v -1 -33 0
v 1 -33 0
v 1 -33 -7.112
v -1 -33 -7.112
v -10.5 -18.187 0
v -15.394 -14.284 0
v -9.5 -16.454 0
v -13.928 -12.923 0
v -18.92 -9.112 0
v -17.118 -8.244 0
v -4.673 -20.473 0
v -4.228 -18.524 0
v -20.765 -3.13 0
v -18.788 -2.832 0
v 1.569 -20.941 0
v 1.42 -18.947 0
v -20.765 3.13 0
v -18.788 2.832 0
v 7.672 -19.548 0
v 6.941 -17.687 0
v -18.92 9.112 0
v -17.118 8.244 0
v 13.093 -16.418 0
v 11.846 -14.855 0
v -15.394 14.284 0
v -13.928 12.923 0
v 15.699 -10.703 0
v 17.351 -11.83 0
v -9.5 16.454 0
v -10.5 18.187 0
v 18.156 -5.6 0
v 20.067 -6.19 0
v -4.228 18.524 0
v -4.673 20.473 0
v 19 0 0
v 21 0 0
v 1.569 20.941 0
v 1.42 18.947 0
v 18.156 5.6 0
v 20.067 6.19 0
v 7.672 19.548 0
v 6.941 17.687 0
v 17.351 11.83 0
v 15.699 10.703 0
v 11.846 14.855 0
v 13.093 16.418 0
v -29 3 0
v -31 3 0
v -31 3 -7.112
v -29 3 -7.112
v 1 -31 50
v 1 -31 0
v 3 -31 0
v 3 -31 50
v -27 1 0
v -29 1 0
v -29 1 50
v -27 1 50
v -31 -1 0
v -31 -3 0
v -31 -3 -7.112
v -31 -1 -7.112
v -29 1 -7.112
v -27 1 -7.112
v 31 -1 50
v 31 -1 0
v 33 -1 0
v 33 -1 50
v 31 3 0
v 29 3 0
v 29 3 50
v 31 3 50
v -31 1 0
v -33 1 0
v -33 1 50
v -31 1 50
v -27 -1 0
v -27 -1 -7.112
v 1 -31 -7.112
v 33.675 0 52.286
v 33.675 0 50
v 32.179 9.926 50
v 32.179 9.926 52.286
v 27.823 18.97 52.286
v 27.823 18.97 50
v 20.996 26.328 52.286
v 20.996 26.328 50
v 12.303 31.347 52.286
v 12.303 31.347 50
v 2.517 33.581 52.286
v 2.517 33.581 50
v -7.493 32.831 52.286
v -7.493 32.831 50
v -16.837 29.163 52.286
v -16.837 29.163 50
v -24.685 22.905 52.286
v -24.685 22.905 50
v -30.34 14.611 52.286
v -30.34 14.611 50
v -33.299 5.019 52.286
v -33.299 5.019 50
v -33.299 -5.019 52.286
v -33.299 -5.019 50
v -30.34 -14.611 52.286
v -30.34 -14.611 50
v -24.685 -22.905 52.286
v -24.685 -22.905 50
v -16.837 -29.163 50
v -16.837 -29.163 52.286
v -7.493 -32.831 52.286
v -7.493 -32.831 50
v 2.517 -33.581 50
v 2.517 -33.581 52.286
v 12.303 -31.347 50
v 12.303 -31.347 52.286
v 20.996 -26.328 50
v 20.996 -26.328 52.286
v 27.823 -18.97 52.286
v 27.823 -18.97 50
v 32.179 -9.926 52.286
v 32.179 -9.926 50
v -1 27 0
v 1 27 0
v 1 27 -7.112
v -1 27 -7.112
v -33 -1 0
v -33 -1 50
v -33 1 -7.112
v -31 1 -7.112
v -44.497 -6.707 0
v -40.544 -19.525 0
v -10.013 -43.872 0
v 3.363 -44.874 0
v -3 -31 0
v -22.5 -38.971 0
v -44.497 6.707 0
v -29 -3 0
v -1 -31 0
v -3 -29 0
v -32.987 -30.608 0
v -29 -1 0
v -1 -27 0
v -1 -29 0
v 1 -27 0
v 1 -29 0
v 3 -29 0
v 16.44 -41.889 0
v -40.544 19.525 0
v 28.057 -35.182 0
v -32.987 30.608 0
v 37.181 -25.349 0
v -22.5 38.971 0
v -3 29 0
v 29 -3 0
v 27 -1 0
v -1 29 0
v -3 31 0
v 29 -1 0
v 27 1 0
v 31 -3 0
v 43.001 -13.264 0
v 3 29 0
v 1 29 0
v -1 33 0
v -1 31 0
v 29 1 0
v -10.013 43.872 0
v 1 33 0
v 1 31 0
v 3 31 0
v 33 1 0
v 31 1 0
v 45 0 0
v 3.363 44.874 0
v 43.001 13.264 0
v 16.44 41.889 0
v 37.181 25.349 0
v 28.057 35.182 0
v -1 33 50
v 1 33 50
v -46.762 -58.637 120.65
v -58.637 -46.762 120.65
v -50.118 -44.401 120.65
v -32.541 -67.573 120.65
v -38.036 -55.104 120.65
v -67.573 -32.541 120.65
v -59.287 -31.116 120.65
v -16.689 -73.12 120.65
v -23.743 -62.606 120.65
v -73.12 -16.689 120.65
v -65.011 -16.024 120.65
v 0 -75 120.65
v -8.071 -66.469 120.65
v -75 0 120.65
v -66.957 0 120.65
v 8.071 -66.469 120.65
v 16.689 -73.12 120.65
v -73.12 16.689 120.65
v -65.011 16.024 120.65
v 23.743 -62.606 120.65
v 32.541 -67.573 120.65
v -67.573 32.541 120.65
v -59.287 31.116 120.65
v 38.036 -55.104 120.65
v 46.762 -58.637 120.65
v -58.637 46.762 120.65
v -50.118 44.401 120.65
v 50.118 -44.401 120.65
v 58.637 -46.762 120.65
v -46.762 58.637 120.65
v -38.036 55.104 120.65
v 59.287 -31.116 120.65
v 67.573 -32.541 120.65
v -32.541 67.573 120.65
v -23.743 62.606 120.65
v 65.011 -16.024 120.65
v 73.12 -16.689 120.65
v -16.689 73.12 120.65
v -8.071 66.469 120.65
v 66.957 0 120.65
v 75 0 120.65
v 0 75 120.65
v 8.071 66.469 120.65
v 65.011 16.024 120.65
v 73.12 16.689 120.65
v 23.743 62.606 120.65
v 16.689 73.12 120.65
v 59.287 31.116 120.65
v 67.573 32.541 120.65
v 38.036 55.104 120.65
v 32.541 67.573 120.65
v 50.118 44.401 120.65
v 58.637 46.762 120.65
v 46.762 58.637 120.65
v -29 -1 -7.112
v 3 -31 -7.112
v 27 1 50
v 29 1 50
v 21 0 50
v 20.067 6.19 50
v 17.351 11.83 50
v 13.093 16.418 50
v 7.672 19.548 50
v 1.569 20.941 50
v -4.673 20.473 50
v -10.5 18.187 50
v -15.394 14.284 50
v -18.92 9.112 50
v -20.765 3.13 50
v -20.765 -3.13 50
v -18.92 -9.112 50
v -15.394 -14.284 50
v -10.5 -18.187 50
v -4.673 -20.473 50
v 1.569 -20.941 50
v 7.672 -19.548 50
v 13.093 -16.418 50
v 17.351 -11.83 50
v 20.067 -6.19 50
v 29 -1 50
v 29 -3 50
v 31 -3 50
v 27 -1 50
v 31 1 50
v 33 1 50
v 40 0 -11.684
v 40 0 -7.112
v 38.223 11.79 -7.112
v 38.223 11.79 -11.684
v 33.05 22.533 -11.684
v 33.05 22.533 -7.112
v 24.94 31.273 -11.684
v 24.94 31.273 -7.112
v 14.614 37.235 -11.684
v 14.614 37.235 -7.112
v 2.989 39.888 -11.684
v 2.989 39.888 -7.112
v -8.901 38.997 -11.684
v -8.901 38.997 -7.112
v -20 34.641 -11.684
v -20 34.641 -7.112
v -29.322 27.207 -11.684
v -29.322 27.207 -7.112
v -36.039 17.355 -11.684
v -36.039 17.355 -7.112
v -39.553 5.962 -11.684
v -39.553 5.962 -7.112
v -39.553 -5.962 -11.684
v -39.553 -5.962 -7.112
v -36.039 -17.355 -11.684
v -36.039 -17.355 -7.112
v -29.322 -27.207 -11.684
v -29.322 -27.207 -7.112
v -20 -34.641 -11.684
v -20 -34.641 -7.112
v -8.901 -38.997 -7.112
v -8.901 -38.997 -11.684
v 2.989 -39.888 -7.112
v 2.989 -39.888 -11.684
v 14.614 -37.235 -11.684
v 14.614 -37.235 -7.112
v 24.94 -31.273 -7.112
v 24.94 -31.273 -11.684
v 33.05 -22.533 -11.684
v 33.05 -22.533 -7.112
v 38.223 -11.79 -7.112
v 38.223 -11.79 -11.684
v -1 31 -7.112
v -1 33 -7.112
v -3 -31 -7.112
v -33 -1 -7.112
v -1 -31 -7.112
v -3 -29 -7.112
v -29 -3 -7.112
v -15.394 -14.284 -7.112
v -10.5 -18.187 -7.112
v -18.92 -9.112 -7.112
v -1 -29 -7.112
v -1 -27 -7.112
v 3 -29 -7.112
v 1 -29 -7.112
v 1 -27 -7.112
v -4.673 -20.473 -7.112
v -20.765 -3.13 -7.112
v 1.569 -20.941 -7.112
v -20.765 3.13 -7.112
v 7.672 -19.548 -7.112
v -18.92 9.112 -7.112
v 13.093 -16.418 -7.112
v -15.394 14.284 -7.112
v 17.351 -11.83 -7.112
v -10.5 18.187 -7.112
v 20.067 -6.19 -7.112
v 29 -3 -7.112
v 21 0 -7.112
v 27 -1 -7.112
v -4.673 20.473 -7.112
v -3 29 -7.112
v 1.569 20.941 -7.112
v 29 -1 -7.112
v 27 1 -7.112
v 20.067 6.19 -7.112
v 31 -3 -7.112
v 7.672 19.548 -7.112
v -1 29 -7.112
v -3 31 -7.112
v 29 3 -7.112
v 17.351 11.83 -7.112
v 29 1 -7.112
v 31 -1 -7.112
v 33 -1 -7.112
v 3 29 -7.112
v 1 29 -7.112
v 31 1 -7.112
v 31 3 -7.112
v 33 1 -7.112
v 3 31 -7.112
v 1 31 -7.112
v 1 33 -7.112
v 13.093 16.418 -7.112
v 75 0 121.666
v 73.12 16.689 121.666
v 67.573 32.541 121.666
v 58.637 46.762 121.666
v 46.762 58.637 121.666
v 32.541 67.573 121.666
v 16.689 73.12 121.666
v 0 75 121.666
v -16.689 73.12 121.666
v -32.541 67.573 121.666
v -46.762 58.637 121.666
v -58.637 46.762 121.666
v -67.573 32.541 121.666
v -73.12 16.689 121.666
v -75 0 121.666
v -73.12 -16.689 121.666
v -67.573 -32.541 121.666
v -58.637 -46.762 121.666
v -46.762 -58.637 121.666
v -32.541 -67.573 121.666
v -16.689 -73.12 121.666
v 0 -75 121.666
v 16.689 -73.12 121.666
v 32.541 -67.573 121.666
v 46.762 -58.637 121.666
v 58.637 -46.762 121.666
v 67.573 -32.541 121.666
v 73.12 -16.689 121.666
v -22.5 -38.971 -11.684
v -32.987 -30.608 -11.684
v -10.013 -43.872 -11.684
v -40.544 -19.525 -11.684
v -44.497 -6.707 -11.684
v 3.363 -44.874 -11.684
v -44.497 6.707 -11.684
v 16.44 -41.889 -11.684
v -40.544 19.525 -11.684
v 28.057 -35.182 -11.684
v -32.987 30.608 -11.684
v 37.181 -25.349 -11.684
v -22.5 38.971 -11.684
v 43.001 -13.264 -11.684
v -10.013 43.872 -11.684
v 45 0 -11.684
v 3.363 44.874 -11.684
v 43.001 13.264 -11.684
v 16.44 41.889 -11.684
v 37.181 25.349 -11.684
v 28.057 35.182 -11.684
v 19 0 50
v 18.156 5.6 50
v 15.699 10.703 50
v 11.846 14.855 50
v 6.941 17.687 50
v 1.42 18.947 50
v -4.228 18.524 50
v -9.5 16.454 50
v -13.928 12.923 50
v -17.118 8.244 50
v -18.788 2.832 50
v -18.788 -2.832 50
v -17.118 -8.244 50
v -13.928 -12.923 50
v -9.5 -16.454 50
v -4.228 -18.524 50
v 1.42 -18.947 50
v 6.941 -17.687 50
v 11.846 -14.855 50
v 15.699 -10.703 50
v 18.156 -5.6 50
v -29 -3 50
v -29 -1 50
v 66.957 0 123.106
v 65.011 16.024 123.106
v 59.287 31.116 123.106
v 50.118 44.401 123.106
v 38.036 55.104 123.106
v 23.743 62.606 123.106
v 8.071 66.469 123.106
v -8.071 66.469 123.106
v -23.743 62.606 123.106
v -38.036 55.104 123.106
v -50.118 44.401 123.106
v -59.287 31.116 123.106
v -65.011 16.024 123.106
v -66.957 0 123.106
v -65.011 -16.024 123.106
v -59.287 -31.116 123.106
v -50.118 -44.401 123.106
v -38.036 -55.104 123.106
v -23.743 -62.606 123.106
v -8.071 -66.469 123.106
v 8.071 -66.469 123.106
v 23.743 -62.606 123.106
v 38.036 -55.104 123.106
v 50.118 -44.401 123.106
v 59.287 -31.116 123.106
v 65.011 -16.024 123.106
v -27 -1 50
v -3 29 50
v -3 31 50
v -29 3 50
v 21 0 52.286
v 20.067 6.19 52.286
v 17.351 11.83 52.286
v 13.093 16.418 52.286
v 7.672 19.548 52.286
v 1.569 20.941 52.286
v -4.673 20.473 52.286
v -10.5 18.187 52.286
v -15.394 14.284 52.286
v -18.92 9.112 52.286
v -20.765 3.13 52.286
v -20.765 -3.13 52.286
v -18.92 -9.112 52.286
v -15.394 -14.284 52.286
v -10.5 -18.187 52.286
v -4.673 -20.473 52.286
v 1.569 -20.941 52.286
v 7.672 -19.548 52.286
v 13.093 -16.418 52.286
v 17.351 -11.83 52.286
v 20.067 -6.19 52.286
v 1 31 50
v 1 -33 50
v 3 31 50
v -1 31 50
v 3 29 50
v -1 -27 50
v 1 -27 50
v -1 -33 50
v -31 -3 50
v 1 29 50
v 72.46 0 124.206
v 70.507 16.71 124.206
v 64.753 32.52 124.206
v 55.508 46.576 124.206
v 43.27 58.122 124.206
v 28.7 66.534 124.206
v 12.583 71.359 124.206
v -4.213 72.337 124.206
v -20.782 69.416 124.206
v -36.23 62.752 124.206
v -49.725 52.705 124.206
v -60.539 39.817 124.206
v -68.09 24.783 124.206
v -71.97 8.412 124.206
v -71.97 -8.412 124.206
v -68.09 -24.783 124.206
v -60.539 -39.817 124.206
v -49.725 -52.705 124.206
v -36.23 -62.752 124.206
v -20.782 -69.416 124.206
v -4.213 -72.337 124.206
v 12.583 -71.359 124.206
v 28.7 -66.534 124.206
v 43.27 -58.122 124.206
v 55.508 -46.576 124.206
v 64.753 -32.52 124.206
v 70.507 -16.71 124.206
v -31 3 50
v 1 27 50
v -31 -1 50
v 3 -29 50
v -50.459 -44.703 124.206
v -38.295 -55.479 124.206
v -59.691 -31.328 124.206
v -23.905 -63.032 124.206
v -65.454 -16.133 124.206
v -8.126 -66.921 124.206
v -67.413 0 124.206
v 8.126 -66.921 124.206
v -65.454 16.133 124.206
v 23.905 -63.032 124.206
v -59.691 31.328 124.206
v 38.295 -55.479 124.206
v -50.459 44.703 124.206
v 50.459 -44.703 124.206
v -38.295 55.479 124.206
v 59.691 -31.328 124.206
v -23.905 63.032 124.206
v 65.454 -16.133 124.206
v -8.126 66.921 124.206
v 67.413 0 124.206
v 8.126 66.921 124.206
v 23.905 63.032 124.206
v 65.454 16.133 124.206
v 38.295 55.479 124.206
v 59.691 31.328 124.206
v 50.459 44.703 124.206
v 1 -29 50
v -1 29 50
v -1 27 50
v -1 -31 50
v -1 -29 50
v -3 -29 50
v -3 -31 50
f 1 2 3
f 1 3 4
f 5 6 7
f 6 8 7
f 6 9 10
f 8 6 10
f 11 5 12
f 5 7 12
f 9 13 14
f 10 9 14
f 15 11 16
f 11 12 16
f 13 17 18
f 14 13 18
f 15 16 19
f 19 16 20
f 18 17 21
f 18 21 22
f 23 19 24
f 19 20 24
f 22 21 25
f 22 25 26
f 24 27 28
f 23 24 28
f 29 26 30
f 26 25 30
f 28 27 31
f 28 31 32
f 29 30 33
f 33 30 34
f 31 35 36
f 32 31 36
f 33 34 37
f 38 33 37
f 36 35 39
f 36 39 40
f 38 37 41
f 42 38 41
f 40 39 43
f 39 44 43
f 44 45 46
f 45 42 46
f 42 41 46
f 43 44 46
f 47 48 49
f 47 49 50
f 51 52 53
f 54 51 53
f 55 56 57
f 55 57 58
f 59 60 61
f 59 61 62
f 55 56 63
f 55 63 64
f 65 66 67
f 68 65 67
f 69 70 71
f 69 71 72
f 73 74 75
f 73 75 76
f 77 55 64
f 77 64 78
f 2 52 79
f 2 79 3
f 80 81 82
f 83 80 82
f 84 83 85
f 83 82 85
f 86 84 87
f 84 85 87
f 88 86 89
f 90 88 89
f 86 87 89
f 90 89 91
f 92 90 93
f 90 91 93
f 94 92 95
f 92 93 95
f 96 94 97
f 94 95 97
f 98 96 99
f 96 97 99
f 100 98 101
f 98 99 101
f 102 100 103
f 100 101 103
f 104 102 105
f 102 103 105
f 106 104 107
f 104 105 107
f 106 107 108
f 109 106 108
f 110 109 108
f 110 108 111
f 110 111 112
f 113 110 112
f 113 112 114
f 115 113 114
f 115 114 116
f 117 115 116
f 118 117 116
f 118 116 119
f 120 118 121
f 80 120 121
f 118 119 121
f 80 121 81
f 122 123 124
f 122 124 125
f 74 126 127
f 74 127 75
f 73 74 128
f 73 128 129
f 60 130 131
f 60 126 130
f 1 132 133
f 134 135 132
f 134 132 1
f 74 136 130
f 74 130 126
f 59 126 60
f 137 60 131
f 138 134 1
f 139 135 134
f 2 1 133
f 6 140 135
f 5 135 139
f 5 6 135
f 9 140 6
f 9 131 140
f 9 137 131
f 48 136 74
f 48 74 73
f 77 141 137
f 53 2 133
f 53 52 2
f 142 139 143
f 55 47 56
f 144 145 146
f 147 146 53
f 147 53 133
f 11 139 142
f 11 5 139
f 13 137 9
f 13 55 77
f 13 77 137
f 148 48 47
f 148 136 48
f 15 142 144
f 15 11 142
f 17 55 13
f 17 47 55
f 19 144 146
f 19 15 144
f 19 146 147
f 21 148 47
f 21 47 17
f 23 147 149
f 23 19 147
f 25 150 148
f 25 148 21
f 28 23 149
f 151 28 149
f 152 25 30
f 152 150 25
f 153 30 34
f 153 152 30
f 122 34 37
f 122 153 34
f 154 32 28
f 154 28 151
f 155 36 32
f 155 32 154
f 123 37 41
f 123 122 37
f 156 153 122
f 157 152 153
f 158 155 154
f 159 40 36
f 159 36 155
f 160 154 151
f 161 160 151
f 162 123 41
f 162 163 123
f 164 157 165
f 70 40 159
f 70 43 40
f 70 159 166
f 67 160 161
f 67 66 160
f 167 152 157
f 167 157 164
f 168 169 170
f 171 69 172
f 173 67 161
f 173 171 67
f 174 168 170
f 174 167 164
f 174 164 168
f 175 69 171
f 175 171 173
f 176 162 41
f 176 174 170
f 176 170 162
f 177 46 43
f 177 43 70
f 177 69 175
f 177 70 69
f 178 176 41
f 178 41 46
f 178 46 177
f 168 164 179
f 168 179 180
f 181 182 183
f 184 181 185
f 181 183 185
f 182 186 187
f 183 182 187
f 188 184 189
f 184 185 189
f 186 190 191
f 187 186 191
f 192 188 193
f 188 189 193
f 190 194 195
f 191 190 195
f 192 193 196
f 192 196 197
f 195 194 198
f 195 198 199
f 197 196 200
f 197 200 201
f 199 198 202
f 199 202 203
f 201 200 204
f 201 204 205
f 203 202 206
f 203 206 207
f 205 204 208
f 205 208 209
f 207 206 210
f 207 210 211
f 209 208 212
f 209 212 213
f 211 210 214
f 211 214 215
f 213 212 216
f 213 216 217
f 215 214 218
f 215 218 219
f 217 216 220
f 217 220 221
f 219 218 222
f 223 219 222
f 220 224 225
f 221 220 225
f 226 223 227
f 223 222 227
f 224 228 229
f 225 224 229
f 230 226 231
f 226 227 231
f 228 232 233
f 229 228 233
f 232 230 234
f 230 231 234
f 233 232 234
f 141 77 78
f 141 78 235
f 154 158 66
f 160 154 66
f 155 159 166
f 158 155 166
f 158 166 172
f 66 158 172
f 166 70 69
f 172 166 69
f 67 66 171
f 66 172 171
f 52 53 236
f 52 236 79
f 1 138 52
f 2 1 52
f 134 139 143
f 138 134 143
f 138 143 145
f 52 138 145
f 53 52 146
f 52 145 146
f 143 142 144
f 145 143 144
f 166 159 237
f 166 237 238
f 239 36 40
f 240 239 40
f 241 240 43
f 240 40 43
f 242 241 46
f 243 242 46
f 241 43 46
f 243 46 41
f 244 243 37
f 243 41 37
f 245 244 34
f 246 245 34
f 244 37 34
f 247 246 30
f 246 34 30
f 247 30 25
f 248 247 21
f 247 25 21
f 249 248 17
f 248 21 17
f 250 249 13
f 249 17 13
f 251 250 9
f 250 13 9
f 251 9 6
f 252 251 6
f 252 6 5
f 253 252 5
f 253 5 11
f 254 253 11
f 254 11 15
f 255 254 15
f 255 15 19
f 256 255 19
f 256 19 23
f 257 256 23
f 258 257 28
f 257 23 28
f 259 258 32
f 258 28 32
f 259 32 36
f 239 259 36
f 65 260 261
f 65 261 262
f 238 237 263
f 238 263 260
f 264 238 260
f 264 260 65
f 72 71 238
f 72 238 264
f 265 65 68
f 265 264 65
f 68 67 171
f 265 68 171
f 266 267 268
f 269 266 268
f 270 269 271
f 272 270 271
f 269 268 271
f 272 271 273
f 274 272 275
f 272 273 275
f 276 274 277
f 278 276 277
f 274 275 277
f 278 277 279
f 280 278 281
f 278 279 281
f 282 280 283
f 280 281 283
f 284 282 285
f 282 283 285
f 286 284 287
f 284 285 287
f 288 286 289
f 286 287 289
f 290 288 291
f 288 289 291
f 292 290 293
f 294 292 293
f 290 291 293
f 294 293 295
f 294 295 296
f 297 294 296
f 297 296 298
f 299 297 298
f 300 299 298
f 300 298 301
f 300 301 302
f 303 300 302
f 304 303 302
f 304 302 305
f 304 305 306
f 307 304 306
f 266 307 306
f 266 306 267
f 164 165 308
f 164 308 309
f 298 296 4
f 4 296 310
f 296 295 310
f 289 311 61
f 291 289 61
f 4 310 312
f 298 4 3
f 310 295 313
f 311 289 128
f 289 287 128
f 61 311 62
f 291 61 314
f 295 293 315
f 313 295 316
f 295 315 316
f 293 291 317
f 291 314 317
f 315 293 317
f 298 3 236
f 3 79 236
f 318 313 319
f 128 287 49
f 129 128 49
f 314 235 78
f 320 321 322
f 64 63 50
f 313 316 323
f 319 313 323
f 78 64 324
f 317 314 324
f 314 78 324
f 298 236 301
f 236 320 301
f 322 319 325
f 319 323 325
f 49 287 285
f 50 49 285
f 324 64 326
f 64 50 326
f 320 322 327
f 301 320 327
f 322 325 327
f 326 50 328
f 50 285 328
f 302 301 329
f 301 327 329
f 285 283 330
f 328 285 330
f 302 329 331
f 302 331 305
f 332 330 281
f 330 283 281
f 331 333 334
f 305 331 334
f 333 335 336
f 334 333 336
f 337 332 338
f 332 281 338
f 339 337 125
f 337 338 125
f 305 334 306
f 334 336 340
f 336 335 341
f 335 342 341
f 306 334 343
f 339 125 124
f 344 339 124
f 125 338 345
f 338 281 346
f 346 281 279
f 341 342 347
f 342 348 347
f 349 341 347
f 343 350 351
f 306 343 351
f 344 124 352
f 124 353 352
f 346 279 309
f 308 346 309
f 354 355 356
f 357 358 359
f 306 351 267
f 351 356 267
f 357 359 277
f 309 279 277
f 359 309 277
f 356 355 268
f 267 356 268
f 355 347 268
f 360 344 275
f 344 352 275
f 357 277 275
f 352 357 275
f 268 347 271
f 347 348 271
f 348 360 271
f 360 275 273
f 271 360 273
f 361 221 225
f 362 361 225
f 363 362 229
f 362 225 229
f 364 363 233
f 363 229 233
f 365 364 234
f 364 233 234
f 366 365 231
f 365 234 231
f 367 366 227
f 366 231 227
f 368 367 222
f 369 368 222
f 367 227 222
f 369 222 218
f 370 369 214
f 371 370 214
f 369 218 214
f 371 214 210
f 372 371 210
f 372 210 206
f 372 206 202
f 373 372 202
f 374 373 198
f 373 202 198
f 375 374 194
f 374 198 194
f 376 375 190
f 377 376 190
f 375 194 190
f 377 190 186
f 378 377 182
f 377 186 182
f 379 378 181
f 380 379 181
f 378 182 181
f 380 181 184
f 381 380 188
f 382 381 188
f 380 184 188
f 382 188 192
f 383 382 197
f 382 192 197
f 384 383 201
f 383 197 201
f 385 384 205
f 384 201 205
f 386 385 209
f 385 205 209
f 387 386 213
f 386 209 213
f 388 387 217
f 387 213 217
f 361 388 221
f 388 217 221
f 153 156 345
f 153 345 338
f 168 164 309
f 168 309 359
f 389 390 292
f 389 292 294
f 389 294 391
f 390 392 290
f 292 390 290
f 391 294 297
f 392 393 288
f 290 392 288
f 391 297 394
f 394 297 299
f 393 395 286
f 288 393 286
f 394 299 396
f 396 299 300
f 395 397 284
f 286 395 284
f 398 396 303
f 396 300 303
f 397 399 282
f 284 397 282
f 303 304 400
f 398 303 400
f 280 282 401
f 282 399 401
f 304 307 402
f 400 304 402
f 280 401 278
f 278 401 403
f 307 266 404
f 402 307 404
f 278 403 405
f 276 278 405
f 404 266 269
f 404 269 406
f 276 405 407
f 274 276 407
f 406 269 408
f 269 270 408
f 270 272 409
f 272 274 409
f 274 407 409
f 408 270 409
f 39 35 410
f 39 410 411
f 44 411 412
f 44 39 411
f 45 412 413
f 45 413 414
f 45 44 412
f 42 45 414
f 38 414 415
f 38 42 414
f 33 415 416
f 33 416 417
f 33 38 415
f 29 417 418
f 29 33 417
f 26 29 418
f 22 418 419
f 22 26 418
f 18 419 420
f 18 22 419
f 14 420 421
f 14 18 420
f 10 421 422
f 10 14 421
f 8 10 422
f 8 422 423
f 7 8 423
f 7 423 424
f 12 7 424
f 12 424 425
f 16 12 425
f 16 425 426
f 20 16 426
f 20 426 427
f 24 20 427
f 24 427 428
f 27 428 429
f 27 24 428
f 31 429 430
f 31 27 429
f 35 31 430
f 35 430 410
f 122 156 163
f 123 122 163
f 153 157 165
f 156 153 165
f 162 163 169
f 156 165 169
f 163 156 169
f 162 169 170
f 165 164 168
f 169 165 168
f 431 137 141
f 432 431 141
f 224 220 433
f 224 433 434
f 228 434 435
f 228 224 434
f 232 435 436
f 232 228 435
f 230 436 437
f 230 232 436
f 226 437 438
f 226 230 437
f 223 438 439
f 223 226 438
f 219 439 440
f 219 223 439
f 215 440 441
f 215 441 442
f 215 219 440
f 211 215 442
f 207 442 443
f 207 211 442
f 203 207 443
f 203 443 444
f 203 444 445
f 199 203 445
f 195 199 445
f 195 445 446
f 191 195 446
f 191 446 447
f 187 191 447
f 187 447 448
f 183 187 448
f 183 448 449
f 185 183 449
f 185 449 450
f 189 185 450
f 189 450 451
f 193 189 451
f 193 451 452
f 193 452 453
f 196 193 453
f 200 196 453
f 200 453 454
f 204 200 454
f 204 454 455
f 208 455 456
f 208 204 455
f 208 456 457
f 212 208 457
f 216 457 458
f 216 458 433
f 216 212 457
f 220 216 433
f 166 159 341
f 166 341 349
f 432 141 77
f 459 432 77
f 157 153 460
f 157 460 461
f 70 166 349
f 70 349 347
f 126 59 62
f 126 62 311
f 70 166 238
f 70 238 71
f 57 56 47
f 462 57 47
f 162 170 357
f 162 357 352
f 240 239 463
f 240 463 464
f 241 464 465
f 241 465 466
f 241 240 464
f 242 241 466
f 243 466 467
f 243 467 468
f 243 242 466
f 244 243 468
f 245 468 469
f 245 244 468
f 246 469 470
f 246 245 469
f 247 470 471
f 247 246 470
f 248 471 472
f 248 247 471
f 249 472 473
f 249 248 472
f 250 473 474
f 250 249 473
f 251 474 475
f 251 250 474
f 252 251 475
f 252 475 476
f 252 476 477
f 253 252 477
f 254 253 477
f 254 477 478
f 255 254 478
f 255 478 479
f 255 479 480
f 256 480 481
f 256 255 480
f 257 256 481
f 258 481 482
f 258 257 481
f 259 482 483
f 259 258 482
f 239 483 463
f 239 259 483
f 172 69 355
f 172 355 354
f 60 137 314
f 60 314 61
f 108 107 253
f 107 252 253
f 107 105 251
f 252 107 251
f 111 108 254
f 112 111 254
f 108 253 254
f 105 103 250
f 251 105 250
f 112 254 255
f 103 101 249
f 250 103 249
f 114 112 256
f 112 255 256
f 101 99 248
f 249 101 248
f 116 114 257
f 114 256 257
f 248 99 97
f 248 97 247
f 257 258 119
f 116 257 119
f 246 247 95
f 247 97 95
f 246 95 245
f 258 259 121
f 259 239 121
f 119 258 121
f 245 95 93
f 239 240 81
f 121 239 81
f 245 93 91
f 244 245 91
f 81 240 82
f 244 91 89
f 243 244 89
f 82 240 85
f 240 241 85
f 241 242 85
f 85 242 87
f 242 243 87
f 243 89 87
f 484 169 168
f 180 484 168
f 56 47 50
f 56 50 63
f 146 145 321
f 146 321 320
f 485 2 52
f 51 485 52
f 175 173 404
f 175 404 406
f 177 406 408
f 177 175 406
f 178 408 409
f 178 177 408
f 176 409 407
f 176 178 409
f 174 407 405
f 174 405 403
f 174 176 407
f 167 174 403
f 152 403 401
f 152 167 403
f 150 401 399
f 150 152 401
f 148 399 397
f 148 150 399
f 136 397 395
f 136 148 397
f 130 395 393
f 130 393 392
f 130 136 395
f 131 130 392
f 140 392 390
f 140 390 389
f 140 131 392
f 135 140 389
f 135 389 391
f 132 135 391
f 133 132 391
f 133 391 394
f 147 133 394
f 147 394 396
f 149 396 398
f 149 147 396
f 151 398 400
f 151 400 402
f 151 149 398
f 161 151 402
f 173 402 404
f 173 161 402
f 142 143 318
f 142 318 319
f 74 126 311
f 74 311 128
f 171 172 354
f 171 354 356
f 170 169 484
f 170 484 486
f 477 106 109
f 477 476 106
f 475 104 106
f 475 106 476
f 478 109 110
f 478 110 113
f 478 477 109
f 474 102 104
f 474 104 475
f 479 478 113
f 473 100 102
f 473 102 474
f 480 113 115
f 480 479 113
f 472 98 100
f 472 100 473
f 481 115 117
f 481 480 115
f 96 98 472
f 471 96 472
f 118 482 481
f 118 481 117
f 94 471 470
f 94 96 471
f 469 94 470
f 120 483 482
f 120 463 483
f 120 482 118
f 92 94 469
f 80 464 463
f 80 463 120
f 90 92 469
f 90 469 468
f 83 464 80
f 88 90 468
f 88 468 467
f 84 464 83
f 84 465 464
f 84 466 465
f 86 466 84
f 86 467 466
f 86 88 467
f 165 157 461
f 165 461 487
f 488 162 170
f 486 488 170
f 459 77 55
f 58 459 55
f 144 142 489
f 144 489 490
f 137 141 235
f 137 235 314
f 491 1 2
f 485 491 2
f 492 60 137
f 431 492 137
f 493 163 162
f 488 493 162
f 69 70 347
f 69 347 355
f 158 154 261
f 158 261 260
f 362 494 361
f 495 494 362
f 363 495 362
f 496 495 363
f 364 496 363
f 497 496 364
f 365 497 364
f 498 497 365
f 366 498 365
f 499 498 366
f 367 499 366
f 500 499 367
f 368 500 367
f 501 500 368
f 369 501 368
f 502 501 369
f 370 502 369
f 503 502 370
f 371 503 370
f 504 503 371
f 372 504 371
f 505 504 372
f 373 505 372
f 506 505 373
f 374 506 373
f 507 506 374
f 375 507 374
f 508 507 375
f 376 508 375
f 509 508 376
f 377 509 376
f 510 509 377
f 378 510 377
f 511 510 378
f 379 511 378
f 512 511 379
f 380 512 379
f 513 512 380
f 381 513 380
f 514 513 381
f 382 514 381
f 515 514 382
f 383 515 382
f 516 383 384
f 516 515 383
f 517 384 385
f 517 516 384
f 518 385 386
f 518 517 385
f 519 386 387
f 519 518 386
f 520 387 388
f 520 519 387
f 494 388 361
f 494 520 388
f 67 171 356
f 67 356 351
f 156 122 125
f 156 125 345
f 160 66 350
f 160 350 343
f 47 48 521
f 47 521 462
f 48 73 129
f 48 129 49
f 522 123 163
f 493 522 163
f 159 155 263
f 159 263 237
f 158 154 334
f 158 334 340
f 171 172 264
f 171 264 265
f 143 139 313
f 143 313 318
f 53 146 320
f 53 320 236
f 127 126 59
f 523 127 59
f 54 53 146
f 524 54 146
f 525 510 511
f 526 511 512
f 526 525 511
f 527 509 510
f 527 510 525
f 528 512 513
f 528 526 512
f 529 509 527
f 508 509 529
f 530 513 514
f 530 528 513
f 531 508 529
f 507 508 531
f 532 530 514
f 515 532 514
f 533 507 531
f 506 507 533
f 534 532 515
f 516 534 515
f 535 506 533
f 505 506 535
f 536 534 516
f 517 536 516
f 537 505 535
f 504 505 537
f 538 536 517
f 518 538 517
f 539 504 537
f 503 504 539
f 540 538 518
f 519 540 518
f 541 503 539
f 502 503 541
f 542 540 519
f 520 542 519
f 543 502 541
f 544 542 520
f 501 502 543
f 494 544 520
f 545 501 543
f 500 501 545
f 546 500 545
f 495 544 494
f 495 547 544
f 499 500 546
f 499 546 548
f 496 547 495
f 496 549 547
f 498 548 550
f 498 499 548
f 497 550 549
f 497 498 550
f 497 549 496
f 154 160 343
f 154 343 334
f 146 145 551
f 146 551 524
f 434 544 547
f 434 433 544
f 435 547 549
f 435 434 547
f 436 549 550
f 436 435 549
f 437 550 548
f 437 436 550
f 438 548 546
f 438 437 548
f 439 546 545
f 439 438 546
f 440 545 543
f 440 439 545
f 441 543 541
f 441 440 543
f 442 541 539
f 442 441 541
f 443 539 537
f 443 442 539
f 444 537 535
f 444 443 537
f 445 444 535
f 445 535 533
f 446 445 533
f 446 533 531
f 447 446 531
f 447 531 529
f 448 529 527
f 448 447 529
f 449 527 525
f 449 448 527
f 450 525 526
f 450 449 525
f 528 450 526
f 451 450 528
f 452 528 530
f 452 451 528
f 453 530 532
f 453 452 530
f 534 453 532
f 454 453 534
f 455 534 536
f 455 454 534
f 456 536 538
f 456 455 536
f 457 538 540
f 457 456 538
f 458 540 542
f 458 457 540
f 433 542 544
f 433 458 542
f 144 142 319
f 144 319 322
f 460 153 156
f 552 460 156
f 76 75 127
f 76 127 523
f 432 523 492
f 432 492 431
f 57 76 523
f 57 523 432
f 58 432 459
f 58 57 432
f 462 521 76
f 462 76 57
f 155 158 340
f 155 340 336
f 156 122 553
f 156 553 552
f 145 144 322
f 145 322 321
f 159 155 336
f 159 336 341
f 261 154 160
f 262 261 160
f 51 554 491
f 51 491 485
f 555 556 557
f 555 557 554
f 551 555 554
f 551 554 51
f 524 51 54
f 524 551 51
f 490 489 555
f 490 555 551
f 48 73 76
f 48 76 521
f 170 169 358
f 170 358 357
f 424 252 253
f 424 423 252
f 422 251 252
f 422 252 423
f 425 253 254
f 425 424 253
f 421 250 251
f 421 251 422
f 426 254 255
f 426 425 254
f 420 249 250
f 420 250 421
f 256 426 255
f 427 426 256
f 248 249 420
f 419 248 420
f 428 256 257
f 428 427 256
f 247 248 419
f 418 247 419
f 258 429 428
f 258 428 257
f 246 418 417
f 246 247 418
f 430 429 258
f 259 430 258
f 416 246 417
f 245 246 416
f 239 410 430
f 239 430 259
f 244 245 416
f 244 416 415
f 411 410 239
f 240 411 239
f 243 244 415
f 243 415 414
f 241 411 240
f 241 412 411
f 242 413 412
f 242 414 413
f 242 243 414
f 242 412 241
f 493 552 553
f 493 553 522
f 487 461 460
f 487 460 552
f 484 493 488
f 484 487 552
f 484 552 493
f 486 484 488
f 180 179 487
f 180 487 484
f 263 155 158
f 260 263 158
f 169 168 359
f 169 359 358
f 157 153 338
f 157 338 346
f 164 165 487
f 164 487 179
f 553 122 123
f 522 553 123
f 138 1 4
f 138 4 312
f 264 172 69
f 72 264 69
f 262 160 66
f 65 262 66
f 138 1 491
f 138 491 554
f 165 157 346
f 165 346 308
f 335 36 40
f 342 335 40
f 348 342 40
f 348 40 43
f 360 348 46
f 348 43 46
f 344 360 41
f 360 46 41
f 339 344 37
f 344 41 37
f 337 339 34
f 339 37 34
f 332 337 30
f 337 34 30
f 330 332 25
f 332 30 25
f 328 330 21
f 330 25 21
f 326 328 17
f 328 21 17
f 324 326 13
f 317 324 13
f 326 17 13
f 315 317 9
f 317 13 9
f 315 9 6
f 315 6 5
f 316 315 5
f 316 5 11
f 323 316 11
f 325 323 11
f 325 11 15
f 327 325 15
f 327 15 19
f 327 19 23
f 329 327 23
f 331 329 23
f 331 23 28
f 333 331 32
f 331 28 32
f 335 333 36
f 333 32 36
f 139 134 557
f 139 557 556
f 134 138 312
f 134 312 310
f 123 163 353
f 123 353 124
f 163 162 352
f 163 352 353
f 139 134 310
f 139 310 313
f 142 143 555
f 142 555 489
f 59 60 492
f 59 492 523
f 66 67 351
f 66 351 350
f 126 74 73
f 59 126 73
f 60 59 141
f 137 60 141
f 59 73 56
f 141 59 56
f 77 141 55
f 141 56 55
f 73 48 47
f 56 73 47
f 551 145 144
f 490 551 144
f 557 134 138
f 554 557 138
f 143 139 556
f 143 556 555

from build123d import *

# Parameters (mm, degrees)
F0_W      = 2
F0_H      = 2
F1_DEPTH  = 50
F0_R      = 21
F0_R_2    = 19
F2_DEPTH  = 50
F3_R      = 33.6748592908
F3_R_2    = 21
F4_DEPTH  = 2.286
F0_R_3    = 10.9886150932
F5_DEPTH  = 120.65
F6_R      = 75
F6_R_2    = 66.9568683552
F7_DEPTH  = 3.556
F0_R_4    = 45
F0_R_5    = 40
F11_DEPTH = 11.684
F12_DEPTH = 7.112
F13_SIZE  = 2.54
F14_SIZE  = 0.1


# Not quite as in the source:
# - a fillet or chamfer that OpenCascade refuses, or shapes differently, is made with other operations: its cross-section is extruded or revolved along the edge and cut away or added
# - the program builds the solid bodies; features that only make, move or delete a surface that nothing else refers to are left out


with BuildPart() as f1:
    # F0 (on Top) → F1 (new body)
    with BuildSketch(Plane.XY):
        with Locations((-2, 30)):
            Rectangle(F0_W, F0_H)
        with Locations((0, 32)):
            Rectangle(F0_W, F0_H)
        with Locations((2, 30)):
            Rectangle(F0_W, F0_H)
        with Locations((0, 28)):
            Rectangle(F0_W, F0_H)
        with Locations((0, 30)):
            Rectangle(F0_W, F0_H)
    extrude(amount=F1_DEPTH)



with BuildPart() as f1b:
    # F0 (on Top) → F1, piece 2 (new body)
    with BuildSketch(Plane.XY):
        with Locations((32, 0)):
            Rectangle(F0_W, F0_H)
        with Locations((28, 0)):
            Rectangle(F0_W, F0_H)
        with Locations((30, -2)):
            Rectangle(F0_W, F0_H)
        with Locations((30, 2)):
            Rectangle(F0_W, F0_H)
        with Locations((30, 0)):
            Rectangle(F0_W, F0_H)
    extrude(amount=F1_DEPTH)


with BuildPart() as f1c:
    # F0 (on Top) → F1, piece 3 (new body)
    with BuildSketch(Plane.XY):
        with Locations((0, -28)):
            Rectangle(F0_W, F0_H)
        with Locations((2, -30)):
            Rectangle(F0_W, F0_H)
        with Locations((-2, -30)):
            Rectangle(F0_W, F0_H)
        with Locations((0, -32)):
            Rectangle(F0_W, F0_H)
        with Locations((0, -30)):
            Rectangle(F0_W, F0_H)
    extrude(amount=F1_DEPTH)


with BuildPart() as f1d:
    # F0 (on Top) → F1, piece 4 (new body)
    with BuildSketch(Plane.XY):
        with Locations((-30, 2)):
            Rectangle(F0_W, F0_H)
        with Locations((-32, 0)):
            Rectangle(F0_W, F0_H)
        with Locations((-28, 0)):
            Rectangle(F0_W, F0_H)
        with Locations((-30, -2)):
            Rectangle(F0_W, F0_H)
        with Locations((-30, 0)):
            Rectangle(F0_W, F0_H)
    extrude(amount=F1_DEPTH)


with BuildPart() as f2:
    # F0 (on Top) → F2 (new body)
    with BuildSketch(Plane.XY):
        Circle(F0_R)
        Circle(F0_R_2, mode=Mode.SUBTRACT)
    extrude(amount=F2_DEPTH)


with BuildPart() as f4:
    # F3 (on face) → F4 (new body)
    with BuildSketch(Plane.XY.offset(50)):
        Circle(F3_R)
        Circle(F3_R_2, mode=Mode.SUBTRACT)
    extrude(amount=F4_DEPTH)


with BuildPart() as f5:
    # F0 (on Top) → F5 (new body)
    with BuildSketch(Plane.XY):
        Circle(F0_R_3)
    extrude(amount=F5_DEPTH)


with BuildPart() as f7:
    # F6 (on face) → F7 (new body)
    with BuildSketch(Plane.XY.offset(120.65)):
        Circle(F6_R)
        Circle(F6_R_2, mode=Mode.SUBTRACT)
    extrude(amount=F7_DEPTH)

    # F13
    f13_edges = [f7.edges().sort_by_distance(p)[0] for p in [
        (-75, 0, 124.206),
    ]]
    chamfer(f13_edges, length=F13_SIZE)

    # F14
    f14_edges = [f7.edges().sort_by_distance(p)[0] for p in [
        (-66.956868, 0, 124.206),
    ]]
    chamfer(f14_edges, length=F14_SIZE)

    # F15: chamfer of 1 on 1 edges, made by hand

    # F15_s1 → F15_t2 (revolve, cut)
    with BuildSketch(Plane.XZ):
        Polygon((67.6639751364, 124.8131067812), (66.9568683552, 123.106), (66.9568683552, 124.106), align=None)
    revolve(axis=Axis((0, 0, 124.106), (0, 0, 1)), mode=Mode.SUBTRACT)


with BuildPart() as f11:
    # F0 (on Top) → F11 (new body)
    with BuildSketch(Plane.XY):
        Circle(F0_R_4)
        Circle(F0_R_5, mode=Mode.SUBTRACT)
    extrude(amount=-F11_DEPTH)


with BuildPart() as f1_1:
    add(f1.part)

    add(f1b.part)  # F12 merges F1b

    add(f1c.part)  # F12 merges F1c

    add(f1d.part)  # F12 merges F1d

    add(f2.part)  # F12 merges F2

    add(f11.part)  # F12 merges F11
    # F0 (on Top) → F12 (join)
    with BuildSketch(Plane.XY):
        Circle(F0_R_5)
        Polygon((-1, -29), (-1, -27), (1, -27), (1, -29), (3, -29), (3, -31), (1, -31), (1, -33), (-1, -33), (-1, -31), (-3, -31), (-3, -29), align=None, mode=Mode.SUBTRACT)
        Polygon((-29, 1), (-27, 1), (-27, -1), (-29, -1), (-29, -3), (-31, -3), (-31, -1), (-33, -1), (-33, 1), (-31, 1), (-31, 3), (-29, 3), align=None, mode=Mode.SUBTRACT)
        Circle(F0_R, mode=Mode.SUBTRACT)
        Polygon((29, -1), (27, -1), (27, 1), (29, 1), (29, 3), (31, 3), (31, 1), (33, 1), (33, -1), (31, -1), (31, -3), (29, -3), align=None, mode=Mode.SUBTRACT)
        Polygon((3, 31), (3, 29), (1, 29), (1, 27), (-1, 27), (-1, 29), (-3, 29), (-3, 31), (-1, 31), (-1, 33), (1, 33), (1, 31), align=None, mode=Mode.SUBTRACT)
    extrude(amount=-F12_DEPTH)


solid = Compound([f4.part, f7.part, f1_1.part])
